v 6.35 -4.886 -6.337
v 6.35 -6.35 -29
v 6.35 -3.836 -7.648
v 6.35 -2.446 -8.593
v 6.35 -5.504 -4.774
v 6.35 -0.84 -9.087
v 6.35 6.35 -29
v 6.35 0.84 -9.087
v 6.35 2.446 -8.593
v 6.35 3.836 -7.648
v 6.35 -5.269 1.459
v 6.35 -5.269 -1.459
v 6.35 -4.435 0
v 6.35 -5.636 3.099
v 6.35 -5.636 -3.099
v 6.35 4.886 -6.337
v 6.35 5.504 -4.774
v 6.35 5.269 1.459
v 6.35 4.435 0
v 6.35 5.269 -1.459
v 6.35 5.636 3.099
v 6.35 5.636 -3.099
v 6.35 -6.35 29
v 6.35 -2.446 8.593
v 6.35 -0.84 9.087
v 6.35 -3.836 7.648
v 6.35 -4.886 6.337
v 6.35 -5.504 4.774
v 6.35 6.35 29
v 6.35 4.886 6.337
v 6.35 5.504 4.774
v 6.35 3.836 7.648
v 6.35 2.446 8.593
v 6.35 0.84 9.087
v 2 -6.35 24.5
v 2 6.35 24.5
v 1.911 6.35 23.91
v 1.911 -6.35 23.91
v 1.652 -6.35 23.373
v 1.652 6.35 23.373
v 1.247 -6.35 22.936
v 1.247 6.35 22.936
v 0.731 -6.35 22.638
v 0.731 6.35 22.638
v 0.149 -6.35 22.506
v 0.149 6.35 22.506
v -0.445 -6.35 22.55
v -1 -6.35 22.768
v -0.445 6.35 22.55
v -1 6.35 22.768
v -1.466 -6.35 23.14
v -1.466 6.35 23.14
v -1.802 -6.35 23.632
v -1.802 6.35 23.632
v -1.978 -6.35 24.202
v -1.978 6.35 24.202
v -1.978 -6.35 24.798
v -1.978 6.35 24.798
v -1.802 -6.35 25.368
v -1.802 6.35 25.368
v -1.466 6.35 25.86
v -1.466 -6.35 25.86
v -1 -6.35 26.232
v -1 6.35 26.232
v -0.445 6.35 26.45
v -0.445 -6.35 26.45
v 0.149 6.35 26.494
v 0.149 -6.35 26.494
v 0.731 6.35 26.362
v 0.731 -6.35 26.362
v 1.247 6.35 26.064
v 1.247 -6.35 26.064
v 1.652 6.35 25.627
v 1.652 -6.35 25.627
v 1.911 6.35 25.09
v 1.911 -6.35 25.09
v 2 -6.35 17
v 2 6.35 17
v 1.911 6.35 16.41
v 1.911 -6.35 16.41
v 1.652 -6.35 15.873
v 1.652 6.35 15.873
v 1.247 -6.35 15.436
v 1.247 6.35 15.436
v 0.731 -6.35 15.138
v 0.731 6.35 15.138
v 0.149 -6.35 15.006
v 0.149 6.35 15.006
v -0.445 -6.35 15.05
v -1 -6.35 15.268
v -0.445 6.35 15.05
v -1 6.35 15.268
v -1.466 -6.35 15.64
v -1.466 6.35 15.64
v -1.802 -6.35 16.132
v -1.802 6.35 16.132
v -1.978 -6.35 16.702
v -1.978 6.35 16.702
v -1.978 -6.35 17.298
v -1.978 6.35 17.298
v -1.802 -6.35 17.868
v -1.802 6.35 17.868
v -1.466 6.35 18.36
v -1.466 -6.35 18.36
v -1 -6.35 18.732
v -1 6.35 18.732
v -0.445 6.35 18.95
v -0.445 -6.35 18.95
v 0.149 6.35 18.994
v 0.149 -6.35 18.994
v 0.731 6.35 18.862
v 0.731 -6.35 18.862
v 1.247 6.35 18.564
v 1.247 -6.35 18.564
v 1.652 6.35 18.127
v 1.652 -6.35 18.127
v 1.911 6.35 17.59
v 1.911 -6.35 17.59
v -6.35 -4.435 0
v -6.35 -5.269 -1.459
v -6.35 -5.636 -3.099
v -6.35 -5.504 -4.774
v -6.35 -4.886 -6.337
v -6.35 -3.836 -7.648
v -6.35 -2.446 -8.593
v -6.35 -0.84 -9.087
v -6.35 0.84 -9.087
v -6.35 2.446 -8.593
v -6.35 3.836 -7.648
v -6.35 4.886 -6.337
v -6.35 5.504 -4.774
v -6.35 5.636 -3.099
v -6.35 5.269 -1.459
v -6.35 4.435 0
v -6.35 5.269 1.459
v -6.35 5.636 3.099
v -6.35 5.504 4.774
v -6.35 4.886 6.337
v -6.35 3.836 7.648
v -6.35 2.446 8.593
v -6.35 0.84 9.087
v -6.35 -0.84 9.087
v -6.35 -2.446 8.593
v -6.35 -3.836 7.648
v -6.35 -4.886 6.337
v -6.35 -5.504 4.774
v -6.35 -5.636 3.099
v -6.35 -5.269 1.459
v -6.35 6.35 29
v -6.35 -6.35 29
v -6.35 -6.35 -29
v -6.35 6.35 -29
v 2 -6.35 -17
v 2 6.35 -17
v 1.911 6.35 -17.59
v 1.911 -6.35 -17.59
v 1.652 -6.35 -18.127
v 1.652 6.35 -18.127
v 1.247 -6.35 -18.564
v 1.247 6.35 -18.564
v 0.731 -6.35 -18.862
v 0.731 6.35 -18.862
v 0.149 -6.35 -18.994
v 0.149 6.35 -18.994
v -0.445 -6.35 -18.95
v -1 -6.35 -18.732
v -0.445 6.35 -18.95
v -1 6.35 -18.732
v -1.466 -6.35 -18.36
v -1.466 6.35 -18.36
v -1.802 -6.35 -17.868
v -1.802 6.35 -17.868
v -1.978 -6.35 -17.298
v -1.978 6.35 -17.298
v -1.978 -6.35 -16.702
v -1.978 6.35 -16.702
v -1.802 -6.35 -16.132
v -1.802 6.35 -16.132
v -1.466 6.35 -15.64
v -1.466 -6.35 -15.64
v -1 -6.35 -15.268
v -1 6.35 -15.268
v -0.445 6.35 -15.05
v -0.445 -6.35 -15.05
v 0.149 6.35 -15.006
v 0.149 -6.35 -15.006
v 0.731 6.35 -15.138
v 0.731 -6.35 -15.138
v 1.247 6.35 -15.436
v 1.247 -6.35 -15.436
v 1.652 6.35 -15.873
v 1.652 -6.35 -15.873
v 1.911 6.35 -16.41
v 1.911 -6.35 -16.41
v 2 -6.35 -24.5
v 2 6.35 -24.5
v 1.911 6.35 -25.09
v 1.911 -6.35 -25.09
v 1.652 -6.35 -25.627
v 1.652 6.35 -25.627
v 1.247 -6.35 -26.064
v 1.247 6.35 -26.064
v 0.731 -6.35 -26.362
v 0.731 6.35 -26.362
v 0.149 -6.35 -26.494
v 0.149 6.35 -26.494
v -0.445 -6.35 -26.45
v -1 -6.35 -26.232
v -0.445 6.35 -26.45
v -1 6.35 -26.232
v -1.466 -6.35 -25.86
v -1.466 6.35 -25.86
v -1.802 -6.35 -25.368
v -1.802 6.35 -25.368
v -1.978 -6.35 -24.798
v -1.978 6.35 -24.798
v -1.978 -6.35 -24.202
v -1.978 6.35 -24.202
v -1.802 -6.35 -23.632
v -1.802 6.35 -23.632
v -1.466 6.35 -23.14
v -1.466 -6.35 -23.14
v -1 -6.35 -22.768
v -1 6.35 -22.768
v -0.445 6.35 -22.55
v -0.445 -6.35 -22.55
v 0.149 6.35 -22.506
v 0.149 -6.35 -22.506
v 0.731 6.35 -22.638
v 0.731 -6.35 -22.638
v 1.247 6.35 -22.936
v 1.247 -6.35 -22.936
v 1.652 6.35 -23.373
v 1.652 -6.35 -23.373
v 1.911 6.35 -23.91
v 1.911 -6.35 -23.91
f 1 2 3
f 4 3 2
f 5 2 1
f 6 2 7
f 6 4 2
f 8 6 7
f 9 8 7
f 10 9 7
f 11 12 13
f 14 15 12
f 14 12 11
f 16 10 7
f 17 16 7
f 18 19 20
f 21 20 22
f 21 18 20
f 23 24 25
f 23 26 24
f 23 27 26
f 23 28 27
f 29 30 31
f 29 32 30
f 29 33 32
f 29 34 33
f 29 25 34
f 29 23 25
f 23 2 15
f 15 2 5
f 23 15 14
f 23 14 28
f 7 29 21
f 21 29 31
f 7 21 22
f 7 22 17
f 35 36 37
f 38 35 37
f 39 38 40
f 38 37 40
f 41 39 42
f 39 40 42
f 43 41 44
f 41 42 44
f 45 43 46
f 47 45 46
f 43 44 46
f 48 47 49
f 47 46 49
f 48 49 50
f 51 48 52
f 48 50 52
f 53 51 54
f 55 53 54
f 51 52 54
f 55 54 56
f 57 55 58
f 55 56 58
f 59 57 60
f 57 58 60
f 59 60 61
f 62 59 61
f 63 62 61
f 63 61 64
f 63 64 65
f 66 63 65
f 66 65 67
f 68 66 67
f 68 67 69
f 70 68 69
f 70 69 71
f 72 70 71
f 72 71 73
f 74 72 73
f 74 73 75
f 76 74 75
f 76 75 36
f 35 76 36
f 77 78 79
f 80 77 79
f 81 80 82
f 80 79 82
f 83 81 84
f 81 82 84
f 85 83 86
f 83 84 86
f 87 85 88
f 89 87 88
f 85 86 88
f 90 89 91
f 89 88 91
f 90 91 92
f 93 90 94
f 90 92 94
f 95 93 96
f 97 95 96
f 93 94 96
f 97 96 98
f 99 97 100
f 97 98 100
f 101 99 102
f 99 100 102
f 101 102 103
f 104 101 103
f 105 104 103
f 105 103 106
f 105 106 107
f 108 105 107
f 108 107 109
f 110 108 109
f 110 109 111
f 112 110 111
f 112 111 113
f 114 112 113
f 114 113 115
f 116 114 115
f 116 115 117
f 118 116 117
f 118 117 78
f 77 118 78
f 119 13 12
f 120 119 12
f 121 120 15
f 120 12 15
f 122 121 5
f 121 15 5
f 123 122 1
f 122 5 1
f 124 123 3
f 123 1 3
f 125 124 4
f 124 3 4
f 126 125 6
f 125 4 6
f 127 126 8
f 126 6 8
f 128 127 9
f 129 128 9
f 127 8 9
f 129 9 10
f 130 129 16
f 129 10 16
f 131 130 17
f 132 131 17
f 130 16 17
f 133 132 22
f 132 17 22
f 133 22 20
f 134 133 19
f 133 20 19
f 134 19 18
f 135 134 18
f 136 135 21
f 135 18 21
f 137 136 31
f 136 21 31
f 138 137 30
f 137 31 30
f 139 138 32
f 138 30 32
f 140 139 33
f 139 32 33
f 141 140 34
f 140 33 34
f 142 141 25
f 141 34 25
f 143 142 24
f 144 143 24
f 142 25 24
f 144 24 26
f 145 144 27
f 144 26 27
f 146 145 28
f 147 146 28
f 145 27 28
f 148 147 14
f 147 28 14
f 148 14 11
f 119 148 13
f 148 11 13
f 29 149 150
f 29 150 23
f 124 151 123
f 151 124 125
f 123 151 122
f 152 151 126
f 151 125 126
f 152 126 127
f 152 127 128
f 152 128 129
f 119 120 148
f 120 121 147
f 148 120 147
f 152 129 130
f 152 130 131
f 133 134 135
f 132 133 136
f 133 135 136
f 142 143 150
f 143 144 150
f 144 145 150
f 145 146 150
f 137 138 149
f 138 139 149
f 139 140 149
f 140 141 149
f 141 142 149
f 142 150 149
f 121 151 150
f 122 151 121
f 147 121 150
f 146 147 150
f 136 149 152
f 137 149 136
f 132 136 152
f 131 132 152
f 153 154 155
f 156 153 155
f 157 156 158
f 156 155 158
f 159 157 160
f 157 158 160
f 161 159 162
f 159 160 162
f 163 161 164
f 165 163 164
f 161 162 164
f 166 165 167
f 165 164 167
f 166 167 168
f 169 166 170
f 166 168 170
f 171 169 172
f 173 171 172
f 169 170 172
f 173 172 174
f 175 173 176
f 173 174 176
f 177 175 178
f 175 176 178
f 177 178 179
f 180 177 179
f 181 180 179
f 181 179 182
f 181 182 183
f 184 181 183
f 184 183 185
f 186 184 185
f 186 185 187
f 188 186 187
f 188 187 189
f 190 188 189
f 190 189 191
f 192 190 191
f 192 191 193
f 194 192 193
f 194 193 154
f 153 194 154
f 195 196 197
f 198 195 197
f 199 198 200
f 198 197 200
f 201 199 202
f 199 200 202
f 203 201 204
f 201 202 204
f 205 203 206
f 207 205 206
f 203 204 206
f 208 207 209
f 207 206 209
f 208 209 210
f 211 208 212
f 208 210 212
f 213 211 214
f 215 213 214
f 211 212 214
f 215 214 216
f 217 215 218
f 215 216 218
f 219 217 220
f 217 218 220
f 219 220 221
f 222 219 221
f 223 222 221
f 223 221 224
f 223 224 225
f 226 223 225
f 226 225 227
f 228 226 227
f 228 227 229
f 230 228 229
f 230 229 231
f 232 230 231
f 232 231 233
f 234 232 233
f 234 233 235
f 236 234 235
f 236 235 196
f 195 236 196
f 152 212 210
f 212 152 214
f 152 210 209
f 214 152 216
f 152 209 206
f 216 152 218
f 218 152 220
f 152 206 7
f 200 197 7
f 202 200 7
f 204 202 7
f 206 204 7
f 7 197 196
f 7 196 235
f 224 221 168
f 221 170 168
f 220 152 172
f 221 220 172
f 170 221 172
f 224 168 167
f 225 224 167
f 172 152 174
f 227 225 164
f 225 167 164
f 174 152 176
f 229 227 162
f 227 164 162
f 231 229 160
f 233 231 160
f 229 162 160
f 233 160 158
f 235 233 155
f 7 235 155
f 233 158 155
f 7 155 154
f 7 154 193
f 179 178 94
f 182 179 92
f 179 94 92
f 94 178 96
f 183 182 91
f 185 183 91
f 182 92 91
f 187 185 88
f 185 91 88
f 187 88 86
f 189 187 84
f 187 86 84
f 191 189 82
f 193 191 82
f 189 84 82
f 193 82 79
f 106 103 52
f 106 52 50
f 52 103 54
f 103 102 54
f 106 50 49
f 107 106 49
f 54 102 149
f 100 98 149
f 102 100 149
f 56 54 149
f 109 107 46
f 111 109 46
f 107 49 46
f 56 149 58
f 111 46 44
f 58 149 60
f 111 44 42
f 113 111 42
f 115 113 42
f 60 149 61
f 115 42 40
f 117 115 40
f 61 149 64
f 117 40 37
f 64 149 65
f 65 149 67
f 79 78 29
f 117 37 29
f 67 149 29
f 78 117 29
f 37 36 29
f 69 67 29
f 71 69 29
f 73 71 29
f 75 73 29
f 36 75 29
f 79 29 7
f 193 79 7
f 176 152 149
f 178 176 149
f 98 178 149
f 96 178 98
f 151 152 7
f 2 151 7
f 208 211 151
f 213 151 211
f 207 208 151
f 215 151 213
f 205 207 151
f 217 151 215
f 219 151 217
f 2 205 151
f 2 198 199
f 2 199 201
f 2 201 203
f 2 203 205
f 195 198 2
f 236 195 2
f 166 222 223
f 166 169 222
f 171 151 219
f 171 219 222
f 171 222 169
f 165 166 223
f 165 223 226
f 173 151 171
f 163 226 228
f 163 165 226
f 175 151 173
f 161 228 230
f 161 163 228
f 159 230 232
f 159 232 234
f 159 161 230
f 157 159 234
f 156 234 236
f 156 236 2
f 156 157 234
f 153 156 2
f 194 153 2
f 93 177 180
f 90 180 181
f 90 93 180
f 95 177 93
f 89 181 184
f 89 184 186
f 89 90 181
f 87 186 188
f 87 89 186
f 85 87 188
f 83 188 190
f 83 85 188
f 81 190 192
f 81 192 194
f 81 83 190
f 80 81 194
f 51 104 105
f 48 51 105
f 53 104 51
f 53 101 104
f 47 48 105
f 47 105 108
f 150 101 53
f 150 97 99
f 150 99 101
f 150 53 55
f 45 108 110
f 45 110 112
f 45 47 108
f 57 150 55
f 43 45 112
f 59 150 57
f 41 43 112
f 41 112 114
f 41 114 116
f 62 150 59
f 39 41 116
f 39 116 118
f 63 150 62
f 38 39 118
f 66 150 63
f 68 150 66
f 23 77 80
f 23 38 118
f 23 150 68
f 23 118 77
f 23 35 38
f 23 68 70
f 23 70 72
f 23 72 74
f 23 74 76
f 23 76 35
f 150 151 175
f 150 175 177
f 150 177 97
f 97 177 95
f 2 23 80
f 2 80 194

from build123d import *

# Parameters (mm, degrees)
ESQUISSE1_W             = 12.7
ESQUISSE1_H             = 12.7
BOSS_EXTRU_1_DEPTH      = 29
ESQUISSE2_R             = 2
ENL_V_MAT_EXTRU_1_DEPTH = 13.7
ENL_V_MAT_EXTRU_2_DEPTH = 13.7


with BuildPart() as part:
    # Esquisse1 → Boss.-Extru.1 (new body, symmetric)
    with BuildSketch(Plane.XY):
        Rectangle(ESQUISSE1_W, ESQUISSE1_H)
    extrude(amount=BOSS_EXTRU_1_DEPTH, both=True)

    # Esquisse2 → Enlèv. mat.-Extru.1 (cut, through all)
    with BuildSketch(Plane(origin=(0, 6.35, 0), x_dir=(1, 0, 0), z_dir=(0, 1, 0))):
        with Locations((0, 24.5)):
            Circle(ESQUISSE2_R)
        with Locations((0, 17)):
            Circle(ESQUISSE2_R)
        with Locations((0, -17)):
            Circle(ESQUISSE2_R)
        with Locations((0, -24.5)):
            Circle(ESQUISSE2_R)
    extrude(amount=-ENL_V_MAT_EXTRU_1_DEPTH, mode=Mode.SUBTRACT)

    # Esquisse3 → Enlèv. mat.-Extru.2 (cut, through all)
    with BuildSketch(Plane(origin=(6.35, 0, 0), x_dir=(0, 0, -1), z_dir=(1, 0, 0))):
        with BuildLine():
            ThreePointArc((0, 4.435369207), (-9.15, 0), (0, -4.435369207))
            ThreePointArc((0, -4.435369207), (9.15, 0), (0, 4.435369207))
        make_face()
    extrude(amount=-ENL_V_MAT_EXTRU_2_DEPTH, mode=Mode.SUBTRACT)


solid = part.part
